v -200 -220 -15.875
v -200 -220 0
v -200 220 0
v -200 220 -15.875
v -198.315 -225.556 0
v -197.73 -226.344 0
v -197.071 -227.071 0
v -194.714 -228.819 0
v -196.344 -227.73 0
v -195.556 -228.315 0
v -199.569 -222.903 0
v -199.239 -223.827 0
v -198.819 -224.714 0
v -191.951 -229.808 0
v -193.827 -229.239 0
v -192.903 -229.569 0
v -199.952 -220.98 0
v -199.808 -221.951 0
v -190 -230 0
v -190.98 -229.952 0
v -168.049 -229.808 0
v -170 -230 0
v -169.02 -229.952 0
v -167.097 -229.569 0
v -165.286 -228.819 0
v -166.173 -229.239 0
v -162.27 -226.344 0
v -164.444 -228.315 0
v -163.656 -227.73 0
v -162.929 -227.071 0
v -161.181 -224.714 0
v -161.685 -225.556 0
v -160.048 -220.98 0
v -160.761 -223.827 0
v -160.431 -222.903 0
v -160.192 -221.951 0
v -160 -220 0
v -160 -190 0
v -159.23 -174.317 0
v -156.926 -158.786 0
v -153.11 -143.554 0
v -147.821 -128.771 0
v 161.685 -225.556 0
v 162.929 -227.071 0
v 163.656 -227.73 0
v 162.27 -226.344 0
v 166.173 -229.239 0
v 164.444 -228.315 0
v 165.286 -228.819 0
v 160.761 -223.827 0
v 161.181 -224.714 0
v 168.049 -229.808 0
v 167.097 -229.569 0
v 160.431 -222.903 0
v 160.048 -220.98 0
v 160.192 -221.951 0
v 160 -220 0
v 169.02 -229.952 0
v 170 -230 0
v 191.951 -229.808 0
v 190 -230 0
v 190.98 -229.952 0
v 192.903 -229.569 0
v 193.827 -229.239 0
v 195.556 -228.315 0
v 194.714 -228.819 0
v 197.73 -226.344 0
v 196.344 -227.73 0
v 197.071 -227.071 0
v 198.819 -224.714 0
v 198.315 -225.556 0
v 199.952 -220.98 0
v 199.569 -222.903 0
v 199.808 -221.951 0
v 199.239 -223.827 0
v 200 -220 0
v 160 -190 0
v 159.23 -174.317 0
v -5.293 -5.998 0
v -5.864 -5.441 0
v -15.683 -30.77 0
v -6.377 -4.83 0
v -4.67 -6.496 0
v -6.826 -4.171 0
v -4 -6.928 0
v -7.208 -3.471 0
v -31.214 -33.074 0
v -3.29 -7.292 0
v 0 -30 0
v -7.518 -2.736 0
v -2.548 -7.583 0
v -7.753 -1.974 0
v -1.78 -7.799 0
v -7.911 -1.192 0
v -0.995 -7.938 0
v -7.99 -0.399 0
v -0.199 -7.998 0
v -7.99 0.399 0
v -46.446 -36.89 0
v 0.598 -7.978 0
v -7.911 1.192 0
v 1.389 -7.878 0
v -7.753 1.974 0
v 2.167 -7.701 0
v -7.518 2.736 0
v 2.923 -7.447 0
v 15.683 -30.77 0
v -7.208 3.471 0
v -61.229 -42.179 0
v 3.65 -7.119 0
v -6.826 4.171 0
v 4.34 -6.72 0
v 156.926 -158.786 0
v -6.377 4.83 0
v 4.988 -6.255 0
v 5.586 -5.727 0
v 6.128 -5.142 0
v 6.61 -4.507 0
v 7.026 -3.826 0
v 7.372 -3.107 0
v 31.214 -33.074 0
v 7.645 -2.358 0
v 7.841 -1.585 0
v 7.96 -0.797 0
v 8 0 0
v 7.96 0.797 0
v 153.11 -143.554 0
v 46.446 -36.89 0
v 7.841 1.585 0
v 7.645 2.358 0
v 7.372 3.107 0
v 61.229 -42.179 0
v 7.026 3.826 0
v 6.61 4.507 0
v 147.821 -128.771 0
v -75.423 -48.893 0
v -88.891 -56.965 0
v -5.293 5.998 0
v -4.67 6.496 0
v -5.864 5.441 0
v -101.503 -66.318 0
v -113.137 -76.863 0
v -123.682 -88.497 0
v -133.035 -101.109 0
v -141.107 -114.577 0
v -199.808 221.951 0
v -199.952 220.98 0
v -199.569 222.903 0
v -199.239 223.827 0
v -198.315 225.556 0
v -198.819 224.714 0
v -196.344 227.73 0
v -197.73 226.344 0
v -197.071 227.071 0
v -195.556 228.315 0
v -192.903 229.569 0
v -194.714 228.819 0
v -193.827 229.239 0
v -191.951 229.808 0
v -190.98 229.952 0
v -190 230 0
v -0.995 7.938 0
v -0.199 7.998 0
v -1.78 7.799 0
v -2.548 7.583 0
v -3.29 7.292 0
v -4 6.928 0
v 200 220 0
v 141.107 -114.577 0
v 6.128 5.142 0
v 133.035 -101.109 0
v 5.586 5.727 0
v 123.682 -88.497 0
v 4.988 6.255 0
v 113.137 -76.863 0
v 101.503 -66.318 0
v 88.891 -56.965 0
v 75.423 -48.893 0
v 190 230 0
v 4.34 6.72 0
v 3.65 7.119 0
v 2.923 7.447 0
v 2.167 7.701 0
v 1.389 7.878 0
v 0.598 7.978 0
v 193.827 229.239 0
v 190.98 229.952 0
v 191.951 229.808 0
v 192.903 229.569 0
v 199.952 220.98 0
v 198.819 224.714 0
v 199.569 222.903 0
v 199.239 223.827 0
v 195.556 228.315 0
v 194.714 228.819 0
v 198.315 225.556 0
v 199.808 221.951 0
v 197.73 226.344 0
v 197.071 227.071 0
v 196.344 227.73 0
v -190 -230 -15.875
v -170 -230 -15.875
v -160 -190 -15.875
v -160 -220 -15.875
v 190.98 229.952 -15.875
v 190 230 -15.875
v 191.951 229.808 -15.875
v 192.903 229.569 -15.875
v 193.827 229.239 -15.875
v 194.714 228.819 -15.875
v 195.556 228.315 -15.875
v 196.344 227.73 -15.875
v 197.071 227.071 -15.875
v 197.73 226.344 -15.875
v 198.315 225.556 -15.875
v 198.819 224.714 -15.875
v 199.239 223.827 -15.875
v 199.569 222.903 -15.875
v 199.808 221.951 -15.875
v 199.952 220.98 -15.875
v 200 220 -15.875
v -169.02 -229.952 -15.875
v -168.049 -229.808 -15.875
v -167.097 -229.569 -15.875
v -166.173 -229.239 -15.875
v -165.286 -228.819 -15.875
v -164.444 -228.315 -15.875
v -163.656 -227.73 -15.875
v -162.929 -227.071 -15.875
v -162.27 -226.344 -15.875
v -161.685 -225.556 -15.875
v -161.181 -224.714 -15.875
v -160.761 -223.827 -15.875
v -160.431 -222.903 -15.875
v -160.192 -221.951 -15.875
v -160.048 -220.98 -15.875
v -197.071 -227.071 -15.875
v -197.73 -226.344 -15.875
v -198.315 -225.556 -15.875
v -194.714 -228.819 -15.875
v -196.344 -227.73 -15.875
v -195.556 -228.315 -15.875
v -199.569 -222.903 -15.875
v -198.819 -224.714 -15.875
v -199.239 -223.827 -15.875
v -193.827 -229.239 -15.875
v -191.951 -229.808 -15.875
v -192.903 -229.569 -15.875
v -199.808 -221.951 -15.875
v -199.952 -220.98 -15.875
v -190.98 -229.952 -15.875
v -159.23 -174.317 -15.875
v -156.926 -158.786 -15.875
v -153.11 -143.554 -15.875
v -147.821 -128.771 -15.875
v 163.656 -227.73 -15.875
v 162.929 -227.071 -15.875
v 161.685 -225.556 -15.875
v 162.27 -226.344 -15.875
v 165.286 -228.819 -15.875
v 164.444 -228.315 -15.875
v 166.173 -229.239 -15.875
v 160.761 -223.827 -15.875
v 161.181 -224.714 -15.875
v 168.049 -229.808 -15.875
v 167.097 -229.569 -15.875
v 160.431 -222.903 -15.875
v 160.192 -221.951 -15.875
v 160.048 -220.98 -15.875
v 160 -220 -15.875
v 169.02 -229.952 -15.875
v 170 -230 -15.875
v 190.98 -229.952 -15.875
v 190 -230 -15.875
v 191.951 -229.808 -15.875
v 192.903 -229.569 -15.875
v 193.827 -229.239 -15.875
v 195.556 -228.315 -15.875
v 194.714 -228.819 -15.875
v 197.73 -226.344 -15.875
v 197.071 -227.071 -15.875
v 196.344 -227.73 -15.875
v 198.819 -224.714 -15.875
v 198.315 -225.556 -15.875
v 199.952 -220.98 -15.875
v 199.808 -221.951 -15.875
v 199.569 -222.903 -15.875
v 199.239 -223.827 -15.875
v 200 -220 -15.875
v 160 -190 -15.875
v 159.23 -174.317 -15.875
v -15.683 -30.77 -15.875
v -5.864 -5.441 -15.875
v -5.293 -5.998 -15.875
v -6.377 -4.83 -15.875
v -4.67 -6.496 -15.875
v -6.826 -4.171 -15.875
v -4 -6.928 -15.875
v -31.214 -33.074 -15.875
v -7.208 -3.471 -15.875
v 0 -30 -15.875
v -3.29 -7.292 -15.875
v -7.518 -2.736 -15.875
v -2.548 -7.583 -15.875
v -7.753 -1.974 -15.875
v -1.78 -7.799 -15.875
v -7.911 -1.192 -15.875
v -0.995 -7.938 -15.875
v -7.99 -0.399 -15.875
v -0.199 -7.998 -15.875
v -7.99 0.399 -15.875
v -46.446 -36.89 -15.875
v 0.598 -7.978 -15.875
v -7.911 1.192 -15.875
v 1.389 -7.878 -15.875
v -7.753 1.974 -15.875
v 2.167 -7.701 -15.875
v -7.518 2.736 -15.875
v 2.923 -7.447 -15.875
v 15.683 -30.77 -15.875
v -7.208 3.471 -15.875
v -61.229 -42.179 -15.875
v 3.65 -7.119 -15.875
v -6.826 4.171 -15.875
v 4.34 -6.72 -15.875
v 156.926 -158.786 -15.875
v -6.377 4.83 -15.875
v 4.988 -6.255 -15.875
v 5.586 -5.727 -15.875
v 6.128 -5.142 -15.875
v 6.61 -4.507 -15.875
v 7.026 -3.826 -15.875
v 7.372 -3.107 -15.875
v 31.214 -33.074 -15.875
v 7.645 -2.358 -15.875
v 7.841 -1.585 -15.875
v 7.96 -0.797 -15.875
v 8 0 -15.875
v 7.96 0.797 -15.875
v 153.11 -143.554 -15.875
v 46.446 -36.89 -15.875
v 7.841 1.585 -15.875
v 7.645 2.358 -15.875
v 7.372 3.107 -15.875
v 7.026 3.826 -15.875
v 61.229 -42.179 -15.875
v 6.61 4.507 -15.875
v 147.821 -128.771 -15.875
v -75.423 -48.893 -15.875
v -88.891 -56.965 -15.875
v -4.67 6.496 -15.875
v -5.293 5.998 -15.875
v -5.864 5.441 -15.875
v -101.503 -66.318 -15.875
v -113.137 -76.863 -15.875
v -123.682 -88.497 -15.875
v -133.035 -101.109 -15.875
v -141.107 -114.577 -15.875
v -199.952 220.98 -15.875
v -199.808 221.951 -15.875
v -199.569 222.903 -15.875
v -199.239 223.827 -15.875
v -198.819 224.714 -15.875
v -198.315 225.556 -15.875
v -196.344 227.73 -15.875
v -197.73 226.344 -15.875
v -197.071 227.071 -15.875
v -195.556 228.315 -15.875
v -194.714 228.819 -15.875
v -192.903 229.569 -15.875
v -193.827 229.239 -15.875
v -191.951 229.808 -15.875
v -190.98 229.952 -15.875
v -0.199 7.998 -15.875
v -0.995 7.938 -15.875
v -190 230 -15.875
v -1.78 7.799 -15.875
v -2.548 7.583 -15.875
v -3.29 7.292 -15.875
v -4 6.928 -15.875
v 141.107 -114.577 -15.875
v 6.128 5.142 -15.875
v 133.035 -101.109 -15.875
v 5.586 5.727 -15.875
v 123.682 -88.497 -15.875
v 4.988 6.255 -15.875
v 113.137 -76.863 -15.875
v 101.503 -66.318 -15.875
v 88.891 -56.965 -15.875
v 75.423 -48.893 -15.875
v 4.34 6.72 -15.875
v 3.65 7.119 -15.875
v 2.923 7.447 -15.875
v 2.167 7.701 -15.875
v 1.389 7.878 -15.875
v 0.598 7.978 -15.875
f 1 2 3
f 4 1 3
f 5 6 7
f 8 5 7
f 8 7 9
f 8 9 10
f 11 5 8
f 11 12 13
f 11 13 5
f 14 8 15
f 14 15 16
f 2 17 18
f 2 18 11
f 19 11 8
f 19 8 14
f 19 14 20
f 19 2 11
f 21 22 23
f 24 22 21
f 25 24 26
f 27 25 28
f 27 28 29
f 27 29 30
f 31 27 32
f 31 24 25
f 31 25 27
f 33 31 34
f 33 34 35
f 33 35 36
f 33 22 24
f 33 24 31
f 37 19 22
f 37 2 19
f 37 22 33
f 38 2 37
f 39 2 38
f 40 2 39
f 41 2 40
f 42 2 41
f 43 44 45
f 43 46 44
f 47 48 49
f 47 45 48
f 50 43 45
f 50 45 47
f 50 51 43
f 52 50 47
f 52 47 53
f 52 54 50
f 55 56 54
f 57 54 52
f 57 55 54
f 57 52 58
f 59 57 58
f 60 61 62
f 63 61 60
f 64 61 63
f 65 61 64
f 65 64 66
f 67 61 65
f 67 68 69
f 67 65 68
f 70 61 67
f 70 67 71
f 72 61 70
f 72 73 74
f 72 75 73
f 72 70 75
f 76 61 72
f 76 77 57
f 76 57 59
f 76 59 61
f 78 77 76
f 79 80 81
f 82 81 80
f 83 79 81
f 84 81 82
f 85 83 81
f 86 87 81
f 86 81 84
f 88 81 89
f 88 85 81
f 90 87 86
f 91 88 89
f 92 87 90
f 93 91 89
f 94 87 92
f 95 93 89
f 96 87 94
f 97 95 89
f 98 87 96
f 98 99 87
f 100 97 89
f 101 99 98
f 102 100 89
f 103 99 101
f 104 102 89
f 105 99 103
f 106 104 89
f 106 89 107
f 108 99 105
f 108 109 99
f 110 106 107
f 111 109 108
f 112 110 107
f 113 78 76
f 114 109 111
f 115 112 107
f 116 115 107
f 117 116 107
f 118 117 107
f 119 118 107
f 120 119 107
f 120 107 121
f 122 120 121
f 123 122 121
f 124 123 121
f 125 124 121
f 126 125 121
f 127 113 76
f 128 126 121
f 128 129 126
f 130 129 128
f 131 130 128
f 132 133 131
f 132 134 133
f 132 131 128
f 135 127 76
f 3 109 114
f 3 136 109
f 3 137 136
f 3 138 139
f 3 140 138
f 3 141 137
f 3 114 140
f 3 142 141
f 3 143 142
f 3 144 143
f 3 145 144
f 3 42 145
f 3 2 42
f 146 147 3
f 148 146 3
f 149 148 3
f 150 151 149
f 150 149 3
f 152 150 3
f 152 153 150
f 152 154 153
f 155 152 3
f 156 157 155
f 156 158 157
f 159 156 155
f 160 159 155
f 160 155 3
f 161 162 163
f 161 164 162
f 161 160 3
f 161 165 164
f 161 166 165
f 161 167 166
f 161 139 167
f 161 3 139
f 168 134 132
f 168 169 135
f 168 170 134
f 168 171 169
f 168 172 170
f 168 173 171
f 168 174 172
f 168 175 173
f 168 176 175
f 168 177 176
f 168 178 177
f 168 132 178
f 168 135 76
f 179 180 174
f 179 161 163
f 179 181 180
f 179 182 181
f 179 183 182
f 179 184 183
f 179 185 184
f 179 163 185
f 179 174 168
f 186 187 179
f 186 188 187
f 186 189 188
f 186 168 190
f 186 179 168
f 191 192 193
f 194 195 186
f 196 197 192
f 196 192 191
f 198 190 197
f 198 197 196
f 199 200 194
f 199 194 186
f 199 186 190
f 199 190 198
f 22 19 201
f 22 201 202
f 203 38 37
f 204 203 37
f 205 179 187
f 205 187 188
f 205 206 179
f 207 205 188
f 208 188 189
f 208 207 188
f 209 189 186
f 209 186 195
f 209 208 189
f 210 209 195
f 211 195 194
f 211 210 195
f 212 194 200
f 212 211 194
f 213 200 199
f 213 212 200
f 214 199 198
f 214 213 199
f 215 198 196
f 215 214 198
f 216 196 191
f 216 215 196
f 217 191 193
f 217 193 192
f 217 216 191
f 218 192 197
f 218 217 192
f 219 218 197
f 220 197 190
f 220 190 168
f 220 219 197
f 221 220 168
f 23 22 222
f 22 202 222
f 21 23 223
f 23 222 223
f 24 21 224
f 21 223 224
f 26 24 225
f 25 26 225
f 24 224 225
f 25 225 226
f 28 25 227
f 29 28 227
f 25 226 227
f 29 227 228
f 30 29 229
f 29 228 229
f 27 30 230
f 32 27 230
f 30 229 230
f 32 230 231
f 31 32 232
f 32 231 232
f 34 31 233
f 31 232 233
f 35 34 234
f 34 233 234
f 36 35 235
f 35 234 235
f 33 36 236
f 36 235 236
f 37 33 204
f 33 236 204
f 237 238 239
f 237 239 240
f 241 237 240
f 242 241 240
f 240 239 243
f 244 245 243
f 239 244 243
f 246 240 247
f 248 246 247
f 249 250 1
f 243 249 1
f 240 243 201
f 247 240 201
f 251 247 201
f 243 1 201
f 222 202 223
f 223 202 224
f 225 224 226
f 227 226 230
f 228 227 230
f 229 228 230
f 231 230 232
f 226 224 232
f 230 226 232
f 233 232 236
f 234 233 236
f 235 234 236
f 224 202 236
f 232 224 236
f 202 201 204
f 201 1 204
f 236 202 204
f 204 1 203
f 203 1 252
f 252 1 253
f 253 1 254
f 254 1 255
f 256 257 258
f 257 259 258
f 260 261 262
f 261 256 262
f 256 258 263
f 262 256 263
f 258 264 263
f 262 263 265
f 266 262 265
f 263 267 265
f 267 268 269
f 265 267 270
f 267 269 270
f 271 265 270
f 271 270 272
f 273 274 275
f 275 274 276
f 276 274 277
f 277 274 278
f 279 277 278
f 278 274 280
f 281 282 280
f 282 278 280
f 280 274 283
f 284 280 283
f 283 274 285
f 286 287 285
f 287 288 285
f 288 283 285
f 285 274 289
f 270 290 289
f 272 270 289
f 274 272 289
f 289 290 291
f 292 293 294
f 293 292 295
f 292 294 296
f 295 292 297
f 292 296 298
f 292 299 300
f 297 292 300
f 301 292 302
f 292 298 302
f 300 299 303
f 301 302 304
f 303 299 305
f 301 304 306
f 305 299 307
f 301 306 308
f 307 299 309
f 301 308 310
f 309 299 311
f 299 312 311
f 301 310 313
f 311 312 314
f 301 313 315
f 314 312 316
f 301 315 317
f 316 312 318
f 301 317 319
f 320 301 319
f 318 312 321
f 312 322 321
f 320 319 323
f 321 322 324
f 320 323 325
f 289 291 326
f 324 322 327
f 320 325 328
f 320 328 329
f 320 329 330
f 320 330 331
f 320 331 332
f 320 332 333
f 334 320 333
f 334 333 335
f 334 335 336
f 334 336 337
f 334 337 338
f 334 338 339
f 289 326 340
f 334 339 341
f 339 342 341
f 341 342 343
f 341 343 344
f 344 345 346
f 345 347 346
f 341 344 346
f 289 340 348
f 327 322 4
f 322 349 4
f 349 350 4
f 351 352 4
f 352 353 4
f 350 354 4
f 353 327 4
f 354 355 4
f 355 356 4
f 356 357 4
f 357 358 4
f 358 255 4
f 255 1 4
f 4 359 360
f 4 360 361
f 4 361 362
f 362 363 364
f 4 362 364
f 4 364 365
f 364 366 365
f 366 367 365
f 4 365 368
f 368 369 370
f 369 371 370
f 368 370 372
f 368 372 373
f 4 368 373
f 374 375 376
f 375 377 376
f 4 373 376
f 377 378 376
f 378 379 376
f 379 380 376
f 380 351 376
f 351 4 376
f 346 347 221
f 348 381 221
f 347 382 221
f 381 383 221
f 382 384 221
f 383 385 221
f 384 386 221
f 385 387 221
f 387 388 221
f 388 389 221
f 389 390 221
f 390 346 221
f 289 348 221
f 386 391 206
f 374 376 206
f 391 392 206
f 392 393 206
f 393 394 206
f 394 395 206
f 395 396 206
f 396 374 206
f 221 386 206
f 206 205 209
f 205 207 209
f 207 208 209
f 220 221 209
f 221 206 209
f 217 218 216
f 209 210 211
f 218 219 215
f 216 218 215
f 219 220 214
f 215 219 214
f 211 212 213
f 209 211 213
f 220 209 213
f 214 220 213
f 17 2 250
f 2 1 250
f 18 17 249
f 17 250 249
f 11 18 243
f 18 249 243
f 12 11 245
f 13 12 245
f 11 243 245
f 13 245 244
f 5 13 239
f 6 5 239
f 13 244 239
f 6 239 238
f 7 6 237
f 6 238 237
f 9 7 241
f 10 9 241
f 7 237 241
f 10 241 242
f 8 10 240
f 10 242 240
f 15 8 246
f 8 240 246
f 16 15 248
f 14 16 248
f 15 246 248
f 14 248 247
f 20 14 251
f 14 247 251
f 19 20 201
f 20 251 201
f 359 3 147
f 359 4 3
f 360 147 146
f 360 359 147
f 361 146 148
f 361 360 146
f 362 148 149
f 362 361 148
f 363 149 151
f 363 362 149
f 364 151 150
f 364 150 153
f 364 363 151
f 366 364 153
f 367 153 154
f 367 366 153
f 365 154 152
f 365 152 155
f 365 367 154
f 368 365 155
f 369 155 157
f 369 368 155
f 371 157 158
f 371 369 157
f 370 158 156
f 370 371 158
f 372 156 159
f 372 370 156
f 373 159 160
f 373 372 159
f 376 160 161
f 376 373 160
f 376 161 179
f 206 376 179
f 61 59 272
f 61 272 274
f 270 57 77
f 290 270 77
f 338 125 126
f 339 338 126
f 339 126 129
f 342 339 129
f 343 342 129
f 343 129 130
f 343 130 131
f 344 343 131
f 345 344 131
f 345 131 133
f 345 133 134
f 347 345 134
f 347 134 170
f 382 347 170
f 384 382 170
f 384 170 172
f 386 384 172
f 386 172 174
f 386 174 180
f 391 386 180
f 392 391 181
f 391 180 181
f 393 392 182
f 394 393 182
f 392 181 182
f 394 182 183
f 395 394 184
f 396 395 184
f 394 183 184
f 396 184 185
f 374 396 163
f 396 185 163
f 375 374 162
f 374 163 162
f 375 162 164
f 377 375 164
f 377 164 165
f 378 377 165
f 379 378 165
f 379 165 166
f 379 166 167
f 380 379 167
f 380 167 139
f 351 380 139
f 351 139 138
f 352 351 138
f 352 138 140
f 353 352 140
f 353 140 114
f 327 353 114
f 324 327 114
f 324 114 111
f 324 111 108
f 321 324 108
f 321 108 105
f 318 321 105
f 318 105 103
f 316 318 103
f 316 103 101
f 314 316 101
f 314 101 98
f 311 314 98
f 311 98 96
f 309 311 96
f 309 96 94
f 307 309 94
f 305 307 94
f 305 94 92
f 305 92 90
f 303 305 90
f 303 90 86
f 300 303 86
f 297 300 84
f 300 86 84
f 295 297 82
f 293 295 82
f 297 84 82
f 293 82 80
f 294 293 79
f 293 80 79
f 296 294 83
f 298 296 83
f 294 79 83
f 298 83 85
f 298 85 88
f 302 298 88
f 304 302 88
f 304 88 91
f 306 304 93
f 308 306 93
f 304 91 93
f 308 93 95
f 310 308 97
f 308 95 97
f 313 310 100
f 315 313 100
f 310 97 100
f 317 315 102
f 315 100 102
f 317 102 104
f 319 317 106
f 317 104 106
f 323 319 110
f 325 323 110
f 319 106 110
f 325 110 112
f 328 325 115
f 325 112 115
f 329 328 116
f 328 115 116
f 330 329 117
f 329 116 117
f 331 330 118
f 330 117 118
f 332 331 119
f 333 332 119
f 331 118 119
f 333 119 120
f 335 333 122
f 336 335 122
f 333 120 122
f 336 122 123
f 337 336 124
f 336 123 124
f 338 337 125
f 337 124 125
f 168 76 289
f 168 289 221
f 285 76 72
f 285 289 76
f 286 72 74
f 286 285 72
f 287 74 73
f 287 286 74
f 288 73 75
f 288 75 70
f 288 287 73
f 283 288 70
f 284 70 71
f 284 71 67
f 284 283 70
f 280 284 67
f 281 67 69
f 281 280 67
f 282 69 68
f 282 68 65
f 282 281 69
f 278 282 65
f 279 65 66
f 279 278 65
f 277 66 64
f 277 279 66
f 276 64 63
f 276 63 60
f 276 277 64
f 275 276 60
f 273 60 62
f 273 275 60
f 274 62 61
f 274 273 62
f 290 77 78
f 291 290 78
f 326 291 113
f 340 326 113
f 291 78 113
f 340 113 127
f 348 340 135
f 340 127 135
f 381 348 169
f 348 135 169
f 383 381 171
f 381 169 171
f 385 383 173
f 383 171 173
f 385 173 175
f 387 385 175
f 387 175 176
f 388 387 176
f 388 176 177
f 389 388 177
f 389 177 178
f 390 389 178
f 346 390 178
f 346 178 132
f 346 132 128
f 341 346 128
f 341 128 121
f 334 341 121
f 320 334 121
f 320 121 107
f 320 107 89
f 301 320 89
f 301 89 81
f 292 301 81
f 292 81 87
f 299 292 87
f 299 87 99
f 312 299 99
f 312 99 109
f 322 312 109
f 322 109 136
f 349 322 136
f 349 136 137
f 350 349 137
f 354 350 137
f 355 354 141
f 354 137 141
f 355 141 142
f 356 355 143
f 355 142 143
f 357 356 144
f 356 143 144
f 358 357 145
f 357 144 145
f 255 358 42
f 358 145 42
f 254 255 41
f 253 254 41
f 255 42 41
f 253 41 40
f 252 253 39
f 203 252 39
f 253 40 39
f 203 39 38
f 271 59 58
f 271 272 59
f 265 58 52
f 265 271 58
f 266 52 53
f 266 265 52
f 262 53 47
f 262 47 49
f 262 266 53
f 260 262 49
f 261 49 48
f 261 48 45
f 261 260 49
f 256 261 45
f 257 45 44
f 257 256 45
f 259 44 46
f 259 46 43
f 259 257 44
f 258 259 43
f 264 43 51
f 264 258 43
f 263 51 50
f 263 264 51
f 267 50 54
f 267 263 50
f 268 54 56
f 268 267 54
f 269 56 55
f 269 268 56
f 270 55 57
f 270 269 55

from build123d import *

# Parameters (mm, degrees)
SKETCH1_W           = 400
SKETCH1_H           = 460
BOSS_EXTRUDE1_DEPTH = 15.875
CUT_EXTRUDE1_DEPTH  = 306.208151308
FILLET1_R           = 10
SKETCH3_R           = 8
CUT_EXTRUDE2_DEPTH  = 306.208151308


with BuildPart() as part:
    # Sketch1 → Boss-Extrude1 (new body)
    with BuildSketch(Plane.XY):
        Rectangle(SKETCH1_W, SKETCH1_H)
    extrude(amount=-BOSS_EXTRUDE1_DEPTH)

    # Sketch2 → Cut-Extrude1 (cut, through all)
    with BuildSketch(Plane.XY):
        with BuildLine():
            Line((160, -230), (160, -190))
            ThreePointArc((160, -190), (0, -30), (-160, -190))
            Line((-160, -190), (-160, -230))
            Line((-160, -230), (160, -230))
        make_face()
    extrude(amount=-CUT_EXTRUDE1_DEPTH, mode=Mode.SUBTRACT)

    # Fillet1
    fillet1_edges = [part.edges().sort_by_distance(p)[0] for p in [
        (160, -230, -7.9375),
        (-160, -230, -7.9375),
        (200, -230, -7.9375),
        (-200, -230, -7.9375),
        (-200, 230, -7.9375),
        (200, 230, -7.9375),
    ]]
    fillet(fillet1_edges, radius=FILLET1_R)

    # Sketch3 → Cut-Extrude2 (cut, through all)
    with BuildSketch(Plane.XY):
        Circle(SKETCH3_R)
    extrude(amount=-CUT_EXTRUDE2_DEPTH, mode=Mode.SUBTRACT)


solid = part.part
